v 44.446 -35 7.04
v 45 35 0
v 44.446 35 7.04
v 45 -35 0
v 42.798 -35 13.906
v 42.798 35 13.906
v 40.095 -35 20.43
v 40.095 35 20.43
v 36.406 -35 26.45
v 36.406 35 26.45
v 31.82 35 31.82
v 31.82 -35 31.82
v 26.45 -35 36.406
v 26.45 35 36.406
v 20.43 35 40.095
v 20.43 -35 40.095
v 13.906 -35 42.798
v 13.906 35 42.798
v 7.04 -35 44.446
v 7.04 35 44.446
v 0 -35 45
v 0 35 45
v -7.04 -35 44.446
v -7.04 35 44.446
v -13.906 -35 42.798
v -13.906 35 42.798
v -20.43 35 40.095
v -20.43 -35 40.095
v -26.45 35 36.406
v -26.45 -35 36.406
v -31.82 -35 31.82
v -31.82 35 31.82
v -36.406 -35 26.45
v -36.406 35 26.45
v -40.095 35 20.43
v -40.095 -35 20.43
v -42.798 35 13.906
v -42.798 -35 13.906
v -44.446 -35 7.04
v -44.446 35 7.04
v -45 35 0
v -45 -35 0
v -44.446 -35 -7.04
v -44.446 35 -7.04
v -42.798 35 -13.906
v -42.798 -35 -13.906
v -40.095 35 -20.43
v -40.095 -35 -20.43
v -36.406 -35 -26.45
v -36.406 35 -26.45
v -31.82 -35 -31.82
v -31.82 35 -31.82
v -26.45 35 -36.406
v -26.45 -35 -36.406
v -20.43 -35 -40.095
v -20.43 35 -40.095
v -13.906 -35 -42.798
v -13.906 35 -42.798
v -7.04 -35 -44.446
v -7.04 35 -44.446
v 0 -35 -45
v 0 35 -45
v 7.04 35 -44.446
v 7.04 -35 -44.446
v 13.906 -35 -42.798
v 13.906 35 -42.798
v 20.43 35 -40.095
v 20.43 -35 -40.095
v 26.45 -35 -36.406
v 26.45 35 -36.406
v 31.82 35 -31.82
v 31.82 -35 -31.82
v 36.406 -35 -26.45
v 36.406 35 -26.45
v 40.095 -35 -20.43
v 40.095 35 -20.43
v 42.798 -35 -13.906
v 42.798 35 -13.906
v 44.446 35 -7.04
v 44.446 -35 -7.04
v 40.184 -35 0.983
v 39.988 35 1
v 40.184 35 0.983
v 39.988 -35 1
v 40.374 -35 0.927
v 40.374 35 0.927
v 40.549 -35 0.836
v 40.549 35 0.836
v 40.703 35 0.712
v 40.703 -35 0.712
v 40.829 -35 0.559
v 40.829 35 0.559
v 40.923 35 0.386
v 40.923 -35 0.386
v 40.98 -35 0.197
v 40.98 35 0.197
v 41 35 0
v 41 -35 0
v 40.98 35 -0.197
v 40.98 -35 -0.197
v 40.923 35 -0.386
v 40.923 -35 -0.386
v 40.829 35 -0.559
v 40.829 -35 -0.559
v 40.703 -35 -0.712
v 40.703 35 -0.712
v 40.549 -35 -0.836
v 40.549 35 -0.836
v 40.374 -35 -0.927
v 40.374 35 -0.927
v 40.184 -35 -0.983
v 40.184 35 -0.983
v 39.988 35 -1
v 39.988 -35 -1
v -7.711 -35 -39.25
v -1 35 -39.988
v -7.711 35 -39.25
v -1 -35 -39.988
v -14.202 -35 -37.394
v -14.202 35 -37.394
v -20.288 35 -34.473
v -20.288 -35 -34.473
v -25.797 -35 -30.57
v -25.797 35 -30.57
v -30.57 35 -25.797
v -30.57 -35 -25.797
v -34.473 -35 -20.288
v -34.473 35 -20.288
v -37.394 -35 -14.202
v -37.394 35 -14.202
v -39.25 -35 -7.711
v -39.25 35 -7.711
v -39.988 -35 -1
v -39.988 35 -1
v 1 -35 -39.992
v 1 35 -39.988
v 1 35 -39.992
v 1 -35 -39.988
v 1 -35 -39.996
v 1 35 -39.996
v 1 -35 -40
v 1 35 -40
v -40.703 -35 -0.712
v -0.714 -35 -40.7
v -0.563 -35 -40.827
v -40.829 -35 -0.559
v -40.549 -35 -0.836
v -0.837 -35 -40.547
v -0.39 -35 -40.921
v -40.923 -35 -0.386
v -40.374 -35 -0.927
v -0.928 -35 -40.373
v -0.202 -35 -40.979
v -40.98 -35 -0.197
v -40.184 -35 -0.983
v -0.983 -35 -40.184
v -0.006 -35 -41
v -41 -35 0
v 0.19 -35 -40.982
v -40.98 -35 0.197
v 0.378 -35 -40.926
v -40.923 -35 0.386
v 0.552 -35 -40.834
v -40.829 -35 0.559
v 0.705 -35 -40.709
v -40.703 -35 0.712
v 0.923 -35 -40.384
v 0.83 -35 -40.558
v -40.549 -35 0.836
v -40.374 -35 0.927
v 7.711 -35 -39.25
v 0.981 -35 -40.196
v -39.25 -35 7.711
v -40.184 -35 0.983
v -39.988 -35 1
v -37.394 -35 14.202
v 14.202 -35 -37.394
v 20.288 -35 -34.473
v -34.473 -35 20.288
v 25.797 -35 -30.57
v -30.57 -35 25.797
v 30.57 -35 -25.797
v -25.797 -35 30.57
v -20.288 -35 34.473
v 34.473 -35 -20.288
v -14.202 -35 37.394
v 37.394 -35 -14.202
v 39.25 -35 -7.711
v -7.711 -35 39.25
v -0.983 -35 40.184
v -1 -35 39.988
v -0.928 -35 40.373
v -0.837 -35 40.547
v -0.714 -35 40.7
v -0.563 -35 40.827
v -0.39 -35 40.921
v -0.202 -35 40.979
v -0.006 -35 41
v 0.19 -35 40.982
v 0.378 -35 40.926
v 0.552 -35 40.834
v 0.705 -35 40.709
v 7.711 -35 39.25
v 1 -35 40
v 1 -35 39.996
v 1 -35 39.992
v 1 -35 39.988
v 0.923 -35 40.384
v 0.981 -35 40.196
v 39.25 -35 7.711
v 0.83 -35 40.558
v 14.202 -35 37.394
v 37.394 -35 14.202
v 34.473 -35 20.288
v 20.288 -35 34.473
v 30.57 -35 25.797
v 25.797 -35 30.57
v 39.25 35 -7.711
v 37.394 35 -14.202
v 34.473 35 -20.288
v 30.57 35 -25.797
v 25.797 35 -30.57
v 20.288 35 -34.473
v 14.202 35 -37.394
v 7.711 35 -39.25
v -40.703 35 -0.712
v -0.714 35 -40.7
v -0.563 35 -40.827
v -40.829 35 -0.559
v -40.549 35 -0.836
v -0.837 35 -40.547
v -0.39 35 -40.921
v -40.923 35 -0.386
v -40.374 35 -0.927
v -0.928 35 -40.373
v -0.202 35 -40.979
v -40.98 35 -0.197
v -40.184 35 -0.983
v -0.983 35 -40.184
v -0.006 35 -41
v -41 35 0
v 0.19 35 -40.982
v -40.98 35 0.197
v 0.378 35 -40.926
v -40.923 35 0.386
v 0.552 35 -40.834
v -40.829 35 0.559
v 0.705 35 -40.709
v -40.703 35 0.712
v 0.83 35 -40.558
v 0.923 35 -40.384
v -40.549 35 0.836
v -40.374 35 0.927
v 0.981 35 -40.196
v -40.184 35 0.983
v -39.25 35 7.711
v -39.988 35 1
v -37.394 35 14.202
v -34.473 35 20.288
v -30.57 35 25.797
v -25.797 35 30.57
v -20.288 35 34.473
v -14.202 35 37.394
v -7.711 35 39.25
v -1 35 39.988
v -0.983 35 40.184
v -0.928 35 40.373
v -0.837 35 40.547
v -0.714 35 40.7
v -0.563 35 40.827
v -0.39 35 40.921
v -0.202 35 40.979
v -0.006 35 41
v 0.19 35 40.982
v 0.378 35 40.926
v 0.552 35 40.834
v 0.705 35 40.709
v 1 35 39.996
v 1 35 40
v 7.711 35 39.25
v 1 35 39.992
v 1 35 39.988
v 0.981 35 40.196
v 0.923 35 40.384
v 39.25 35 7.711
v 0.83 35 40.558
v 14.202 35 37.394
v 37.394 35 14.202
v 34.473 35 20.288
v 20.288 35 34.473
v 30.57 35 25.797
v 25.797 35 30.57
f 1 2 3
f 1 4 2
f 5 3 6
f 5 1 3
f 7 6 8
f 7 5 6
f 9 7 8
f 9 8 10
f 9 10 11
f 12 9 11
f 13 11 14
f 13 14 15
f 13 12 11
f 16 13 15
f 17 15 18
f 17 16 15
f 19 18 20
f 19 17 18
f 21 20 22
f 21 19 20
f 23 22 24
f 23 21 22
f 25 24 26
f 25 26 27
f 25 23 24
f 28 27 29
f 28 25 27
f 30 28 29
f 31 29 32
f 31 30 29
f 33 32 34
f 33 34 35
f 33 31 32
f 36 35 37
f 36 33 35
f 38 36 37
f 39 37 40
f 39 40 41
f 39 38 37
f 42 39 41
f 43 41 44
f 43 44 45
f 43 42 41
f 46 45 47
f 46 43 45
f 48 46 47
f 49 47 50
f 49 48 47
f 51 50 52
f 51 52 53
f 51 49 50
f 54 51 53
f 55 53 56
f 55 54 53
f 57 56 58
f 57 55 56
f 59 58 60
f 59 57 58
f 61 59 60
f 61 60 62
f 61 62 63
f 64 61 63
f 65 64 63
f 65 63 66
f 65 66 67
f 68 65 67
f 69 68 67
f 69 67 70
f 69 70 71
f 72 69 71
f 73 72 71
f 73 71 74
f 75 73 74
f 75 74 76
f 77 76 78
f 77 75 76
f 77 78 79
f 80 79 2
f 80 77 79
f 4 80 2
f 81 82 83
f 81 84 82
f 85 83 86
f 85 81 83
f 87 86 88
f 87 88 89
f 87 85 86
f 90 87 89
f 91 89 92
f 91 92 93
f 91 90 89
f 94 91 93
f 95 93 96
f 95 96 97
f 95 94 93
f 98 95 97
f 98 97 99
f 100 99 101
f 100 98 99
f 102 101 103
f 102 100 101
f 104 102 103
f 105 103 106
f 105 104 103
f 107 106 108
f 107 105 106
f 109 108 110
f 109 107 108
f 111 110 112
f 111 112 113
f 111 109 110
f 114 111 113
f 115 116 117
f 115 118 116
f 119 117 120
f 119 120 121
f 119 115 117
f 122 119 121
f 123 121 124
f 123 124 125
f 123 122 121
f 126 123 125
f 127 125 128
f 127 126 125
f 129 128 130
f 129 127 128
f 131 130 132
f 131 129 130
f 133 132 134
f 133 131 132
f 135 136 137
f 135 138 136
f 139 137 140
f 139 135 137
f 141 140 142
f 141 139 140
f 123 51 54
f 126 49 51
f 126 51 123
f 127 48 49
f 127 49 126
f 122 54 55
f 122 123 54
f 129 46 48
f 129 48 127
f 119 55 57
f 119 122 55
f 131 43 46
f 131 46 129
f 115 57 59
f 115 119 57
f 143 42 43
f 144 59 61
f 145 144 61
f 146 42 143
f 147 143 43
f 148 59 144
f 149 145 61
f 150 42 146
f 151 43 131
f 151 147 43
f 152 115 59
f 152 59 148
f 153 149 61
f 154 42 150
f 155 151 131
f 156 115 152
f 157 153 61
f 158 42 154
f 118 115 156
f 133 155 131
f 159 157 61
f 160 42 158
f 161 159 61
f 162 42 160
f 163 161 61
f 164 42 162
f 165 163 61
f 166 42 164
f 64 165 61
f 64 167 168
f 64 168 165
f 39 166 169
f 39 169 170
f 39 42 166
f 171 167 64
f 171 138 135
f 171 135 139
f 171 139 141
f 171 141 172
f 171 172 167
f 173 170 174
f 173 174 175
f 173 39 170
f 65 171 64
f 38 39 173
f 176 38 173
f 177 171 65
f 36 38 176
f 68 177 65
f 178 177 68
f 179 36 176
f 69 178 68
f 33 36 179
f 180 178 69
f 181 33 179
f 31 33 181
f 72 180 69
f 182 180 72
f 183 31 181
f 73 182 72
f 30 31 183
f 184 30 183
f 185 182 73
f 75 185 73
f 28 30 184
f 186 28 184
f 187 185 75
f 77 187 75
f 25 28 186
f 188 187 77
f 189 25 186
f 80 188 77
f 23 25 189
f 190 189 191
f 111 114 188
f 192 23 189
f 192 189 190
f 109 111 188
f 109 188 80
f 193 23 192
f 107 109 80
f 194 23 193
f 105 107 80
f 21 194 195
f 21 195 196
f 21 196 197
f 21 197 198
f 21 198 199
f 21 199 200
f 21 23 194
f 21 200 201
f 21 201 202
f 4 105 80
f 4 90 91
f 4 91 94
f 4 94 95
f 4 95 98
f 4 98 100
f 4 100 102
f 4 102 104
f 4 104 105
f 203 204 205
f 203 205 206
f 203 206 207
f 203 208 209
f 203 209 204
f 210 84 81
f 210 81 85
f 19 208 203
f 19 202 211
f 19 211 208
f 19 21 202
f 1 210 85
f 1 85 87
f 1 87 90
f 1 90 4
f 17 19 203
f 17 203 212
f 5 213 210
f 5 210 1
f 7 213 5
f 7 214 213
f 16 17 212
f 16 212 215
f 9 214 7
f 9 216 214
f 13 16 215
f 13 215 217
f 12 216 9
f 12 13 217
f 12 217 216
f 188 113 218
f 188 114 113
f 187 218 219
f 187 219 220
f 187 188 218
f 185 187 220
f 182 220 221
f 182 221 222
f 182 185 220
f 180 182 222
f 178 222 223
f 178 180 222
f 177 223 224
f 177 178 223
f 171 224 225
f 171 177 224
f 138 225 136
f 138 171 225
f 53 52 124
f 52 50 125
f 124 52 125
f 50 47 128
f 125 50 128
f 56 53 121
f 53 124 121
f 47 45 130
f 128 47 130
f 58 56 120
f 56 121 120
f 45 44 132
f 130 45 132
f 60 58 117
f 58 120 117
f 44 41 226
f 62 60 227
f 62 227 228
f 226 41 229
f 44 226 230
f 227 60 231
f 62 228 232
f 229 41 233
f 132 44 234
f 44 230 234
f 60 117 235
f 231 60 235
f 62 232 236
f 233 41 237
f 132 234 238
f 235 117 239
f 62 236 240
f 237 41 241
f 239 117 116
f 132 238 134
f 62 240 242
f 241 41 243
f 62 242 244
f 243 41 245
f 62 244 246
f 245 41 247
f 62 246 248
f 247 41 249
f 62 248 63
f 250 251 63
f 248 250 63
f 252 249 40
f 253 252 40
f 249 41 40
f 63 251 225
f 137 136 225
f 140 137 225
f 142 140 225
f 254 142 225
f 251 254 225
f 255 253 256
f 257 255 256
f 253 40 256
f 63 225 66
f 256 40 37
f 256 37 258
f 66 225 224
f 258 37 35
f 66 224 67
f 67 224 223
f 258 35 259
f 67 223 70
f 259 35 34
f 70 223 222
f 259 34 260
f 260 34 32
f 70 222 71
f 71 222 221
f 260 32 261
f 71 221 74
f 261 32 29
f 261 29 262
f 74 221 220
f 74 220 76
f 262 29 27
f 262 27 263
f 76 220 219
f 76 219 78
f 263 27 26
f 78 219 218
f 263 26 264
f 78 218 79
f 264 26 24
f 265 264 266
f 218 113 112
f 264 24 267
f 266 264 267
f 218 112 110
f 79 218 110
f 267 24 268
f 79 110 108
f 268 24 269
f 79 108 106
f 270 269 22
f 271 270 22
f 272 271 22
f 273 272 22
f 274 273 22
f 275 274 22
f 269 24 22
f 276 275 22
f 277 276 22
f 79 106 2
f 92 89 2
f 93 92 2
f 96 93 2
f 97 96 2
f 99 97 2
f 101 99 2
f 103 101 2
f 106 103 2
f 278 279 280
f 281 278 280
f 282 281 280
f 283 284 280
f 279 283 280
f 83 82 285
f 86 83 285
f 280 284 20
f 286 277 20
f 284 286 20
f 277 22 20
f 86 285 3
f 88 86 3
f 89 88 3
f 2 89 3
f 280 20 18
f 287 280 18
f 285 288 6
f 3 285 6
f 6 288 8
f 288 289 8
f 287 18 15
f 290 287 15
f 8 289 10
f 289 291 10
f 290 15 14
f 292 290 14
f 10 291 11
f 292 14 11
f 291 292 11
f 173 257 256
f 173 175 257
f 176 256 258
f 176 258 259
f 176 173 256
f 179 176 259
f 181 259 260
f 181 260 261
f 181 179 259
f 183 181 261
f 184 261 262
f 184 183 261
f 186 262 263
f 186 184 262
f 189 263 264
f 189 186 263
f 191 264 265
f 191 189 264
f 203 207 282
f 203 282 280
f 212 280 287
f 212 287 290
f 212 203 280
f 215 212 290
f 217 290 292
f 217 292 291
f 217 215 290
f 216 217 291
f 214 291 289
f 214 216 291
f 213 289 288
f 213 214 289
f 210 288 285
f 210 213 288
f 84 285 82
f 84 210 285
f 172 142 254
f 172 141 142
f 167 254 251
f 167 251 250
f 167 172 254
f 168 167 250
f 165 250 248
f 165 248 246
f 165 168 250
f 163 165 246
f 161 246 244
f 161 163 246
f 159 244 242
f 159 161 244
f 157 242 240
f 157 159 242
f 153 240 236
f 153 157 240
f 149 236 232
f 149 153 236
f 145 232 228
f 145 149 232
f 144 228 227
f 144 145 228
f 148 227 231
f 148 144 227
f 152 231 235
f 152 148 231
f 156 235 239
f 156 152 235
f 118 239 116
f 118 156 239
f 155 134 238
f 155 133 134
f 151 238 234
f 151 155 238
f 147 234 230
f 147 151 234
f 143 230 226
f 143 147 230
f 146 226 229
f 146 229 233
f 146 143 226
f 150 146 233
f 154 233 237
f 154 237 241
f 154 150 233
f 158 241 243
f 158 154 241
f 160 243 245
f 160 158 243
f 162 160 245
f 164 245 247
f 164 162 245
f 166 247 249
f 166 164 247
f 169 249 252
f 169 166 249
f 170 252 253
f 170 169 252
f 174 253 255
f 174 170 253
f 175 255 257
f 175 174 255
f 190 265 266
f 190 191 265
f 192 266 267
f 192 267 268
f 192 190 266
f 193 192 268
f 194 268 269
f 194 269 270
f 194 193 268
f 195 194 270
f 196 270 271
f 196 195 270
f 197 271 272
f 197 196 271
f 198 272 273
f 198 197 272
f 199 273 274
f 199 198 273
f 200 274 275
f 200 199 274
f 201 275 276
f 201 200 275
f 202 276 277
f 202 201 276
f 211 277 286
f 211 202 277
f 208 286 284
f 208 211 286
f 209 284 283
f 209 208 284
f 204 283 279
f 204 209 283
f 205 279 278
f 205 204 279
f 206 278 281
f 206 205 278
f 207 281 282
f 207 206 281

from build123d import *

# Parameters (mm, degrees)
F0_R     = 45
F1_DEPTH = 35


with BuildPart() as f1:
    # F0 (on Front) → F1 (new body, symmetric)
    with BuildSketch(Plane.XZ):
        Circle(F0_R)
        with BuildLine():
            ThreePointArc((0.999922, 39.9875), (28.284271, 28.284271), (39.9875, 0.999922))
            ThreePointArc((39.9875, 0.999922), (40.702673, 0.711512), (41, 0))
            ThreePointArc((41, 0), (40.702673, -0.711512), (39.9875, -0.999922))
            ThreePointArc((39.9875, -0.999922), (28.284271, -28.284271), (0.999922, -39.9875))
            ThreePointArc((0.999922, -39.9875), (0.99998, -39.99375), (1, -40))
            ThreePointArc((1, -40), (-0.00625, -40.99998), (-0.999922, -39.9875))
            ThreePointArc((-0.999922, -39.9875), (-28.284271, -28.284271), (-39.9875, -0.999922))
            ThreePointArc((-39.9875, -0.999922), (-41, 0), (-39.9875, 0.999922))
            ThreePointArc((-39.9875, 0.999922), (-28.284271, 28.284271), (-0.999922, 39.9875))
            ThreePointArc((-0.999922, 39.9875), (-0.00625, 40.99998), (1, 40))
            ThreePointArc((1, 40), (0.99998, 39.99375), (0.999922, 39.9875))
        make_face(mode=Mode.SUBTRACT)
    extrude(amount=F1_DEPTH, both=True)


solid = f1.part
